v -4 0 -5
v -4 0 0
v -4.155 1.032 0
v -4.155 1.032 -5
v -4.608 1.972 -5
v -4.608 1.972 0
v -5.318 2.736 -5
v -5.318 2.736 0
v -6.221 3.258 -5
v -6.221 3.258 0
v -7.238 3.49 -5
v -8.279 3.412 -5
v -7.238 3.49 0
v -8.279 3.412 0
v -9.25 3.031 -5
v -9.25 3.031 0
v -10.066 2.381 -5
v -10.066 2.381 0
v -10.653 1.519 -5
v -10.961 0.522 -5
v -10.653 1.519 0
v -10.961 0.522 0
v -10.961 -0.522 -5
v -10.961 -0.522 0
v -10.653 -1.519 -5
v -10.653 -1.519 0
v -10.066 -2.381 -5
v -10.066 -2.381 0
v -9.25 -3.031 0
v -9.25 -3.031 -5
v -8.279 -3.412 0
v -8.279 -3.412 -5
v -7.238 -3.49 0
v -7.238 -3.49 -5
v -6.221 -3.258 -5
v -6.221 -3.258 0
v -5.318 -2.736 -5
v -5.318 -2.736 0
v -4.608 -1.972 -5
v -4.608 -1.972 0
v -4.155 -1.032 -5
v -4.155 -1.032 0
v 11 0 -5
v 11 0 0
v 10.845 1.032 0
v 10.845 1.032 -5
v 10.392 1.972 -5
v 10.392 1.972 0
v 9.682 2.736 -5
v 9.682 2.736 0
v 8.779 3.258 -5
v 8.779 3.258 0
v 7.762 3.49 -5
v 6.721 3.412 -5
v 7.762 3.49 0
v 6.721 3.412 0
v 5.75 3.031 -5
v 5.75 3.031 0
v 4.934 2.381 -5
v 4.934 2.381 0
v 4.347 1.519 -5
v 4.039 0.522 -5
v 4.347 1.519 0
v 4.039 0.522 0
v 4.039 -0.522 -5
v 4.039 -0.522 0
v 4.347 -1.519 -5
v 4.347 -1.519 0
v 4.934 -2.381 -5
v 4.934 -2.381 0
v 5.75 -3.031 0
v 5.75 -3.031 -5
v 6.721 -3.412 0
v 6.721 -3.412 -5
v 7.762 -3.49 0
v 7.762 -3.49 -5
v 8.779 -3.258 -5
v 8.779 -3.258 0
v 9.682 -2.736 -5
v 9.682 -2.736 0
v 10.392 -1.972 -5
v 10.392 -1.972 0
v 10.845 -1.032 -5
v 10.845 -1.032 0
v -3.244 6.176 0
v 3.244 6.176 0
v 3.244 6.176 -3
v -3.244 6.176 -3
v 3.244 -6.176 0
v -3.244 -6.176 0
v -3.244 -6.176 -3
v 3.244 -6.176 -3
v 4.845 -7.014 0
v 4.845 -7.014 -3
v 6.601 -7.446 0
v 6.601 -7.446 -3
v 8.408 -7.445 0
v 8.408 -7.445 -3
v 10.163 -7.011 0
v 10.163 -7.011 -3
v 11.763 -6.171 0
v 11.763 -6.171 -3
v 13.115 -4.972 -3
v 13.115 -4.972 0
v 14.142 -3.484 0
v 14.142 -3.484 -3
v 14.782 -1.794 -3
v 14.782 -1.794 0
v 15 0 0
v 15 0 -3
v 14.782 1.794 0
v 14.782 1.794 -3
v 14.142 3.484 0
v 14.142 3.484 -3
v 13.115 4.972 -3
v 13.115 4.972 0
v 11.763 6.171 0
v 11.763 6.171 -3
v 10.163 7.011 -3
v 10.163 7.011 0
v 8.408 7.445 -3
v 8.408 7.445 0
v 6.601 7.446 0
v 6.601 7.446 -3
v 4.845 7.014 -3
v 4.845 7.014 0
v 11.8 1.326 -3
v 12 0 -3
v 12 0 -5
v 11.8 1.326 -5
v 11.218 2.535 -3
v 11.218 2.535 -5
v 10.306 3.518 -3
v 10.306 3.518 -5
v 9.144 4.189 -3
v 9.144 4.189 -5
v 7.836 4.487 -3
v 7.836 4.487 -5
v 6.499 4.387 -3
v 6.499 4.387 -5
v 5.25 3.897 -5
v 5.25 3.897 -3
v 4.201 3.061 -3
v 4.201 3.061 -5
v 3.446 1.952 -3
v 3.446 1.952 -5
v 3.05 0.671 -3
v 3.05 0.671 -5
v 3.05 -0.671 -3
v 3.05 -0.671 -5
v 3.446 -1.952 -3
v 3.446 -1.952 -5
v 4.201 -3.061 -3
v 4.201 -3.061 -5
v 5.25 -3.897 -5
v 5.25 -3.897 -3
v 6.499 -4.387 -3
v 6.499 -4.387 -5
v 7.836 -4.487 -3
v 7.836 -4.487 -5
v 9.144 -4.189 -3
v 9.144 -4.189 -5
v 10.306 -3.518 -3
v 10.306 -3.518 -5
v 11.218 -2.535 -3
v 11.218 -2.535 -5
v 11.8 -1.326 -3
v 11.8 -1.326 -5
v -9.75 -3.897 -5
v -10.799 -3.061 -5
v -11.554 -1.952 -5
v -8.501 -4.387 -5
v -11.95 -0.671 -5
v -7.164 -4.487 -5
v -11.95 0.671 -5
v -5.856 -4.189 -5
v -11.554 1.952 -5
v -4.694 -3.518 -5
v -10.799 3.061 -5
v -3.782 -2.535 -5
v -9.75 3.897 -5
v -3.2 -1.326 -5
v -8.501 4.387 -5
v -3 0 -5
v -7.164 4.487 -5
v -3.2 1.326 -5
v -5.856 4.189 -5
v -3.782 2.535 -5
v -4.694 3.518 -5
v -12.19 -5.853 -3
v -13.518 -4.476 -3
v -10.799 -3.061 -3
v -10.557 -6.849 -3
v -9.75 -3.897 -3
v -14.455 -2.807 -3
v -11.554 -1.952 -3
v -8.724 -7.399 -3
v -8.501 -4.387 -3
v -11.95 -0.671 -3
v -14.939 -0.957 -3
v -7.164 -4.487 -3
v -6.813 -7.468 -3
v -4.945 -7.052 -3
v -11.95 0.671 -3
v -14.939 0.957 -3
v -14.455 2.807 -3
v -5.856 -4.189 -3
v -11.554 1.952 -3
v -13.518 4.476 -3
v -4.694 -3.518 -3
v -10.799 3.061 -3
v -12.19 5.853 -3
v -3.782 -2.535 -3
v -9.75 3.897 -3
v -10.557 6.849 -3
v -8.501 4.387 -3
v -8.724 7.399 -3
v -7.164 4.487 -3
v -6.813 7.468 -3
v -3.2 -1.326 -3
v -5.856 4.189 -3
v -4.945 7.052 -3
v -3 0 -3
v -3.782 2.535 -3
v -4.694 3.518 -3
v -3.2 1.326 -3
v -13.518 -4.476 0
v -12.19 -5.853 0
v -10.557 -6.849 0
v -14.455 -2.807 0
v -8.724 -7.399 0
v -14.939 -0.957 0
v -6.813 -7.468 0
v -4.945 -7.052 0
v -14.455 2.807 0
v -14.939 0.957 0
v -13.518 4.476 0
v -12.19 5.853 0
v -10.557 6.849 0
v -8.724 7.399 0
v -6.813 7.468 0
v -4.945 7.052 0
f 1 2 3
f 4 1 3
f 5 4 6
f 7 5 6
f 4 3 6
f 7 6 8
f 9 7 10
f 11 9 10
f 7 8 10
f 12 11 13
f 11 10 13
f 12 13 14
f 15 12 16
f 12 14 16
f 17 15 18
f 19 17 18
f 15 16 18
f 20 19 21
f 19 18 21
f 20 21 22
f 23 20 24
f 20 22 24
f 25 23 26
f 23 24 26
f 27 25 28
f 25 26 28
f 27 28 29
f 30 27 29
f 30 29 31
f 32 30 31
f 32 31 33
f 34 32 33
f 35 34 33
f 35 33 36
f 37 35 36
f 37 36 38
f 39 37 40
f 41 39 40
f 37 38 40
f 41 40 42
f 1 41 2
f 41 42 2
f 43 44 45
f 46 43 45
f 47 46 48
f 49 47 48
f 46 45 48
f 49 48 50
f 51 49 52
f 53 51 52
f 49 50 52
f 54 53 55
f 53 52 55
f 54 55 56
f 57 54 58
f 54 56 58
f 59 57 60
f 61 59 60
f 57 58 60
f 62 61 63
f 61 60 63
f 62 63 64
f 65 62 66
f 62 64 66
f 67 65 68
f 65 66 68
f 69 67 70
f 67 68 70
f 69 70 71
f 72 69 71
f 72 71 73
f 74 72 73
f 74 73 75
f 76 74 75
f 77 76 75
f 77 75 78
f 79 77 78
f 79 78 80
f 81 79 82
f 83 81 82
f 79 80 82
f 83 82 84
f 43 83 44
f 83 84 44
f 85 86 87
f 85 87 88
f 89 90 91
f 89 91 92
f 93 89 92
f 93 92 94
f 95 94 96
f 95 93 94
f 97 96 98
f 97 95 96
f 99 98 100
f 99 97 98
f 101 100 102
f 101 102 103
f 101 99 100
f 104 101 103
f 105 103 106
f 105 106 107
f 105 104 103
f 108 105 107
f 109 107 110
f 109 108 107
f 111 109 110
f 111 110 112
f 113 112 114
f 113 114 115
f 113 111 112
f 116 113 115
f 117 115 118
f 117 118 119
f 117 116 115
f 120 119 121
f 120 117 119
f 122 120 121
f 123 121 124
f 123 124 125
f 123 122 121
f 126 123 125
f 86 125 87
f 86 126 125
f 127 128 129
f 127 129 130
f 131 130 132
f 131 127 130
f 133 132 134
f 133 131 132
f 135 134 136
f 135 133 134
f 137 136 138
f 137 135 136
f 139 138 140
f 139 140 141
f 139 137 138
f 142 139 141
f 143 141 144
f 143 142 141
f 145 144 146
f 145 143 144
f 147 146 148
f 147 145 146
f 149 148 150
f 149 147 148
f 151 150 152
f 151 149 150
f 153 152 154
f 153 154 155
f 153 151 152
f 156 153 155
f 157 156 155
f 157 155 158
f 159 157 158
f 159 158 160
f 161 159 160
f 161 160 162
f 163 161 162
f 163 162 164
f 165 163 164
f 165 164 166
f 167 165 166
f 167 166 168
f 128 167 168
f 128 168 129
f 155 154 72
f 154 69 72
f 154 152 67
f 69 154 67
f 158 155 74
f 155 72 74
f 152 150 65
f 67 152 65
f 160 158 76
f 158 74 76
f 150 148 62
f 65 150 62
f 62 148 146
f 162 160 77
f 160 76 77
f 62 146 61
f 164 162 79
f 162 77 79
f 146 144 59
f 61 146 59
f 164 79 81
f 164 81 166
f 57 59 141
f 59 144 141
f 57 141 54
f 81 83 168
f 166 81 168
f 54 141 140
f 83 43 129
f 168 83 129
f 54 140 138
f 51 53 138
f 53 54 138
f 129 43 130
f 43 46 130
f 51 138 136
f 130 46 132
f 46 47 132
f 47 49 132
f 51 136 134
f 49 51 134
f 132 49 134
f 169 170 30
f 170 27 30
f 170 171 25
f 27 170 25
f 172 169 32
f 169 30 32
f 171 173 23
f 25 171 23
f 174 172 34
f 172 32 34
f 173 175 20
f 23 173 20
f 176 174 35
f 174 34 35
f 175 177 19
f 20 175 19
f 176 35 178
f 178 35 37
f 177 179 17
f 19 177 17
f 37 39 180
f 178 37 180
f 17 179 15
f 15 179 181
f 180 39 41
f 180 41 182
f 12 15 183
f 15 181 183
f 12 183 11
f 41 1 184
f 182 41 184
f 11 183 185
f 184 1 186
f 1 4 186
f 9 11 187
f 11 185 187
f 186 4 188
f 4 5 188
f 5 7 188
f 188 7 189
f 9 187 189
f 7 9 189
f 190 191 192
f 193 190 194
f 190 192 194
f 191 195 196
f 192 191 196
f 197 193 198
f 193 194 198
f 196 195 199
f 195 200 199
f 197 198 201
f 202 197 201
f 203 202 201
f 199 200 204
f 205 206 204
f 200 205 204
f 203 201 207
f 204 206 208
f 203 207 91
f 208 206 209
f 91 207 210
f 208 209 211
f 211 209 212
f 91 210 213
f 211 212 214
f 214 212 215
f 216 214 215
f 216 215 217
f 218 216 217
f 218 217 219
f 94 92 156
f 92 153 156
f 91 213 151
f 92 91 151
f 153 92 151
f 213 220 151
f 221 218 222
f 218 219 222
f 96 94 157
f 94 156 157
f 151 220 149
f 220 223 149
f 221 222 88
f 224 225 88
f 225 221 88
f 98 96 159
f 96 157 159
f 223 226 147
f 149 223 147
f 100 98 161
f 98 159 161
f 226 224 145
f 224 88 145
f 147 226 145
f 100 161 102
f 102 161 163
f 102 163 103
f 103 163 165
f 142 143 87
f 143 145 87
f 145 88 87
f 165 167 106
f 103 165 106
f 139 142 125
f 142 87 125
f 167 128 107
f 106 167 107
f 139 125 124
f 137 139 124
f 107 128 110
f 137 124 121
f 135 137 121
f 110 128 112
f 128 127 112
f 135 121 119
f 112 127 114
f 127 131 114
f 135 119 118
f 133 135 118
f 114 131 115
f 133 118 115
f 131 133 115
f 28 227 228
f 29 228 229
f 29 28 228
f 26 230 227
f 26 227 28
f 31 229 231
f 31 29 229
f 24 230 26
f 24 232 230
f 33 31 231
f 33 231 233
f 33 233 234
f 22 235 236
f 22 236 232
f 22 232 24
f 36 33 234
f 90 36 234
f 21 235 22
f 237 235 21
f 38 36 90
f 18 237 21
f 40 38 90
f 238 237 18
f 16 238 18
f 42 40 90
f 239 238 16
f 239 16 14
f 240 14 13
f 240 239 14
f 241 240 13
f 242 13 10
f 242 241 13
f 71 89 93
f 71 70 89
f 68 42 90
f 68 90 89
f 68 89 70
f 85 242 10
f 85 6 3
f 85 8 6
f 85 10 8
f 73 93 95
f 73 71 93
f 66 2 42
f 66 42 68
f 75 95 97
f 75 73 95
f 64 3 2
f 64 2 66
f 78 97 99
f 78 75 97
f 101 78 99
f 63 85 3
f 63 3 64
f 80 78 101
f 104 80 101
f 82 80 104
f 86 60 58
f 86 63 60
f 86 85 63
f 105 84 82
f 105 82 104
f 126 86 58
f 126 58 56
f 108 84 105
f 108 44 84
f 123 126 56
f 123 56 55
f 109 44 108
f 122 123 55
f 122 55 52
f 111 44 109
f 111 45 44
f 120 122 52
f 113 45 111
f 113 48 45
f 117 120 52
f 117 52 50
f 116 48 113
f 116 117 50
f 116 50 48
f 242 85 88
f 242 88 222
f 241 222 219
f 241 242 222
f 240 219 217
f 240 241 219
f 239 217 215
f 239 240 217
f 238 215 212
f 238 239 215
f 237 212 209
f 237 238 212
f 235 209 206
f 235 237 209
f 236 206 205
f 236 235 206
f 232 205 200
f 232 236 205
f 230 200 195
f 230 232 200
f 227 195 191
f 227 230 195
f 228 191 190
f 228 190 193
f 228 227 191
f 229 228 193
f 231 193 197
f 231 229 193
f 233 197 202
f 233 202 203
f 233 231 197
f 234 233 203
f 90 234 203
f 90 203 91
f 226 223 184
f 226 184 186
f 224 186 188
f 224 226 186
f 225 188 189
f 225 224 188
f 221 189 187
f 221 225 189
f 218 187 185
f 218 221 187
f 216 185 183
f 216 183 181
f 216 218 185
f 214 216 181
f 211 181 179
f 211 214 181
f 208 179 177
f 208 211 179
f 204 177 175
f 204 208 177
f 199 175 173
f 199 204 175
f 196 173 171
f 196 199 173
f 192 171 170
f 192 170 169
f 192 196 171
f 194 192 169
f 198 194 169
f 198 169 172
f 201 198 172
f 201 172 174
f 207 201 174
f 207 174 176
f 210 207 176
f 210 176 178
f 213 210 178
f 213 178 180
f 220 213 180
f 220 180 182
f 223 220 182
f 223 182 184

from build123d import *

# Parameters (mm, degrees)
F0_R     = 4.5
F1_DEPTH = 3
F0_R_2   = 3.5
F2_DEPTH = 5


with BuildPart() as f1:
    # F0 (on Top) → F1 (new body)
    with BuildSketch(Plane.XY):
        with BuildLine():
            ThreePointArc((0, 0), (-0.860465, 3.488061), (-3.244419, 6.175762))
            ThreePointArc((-3.244419, 6.175762), (-15, 0), (-3.244419, -6.175762))
            ThreePointArc((-3.244419, -6.175762), (-0.860465, -3.488061), (0, 0))
        make_face()
        with Locations((-7.5, 0)):
            Circle(F0_R, mode=Mode.SUBTRACT)
        with BuildLine():
            ThreePointArc((15, 0), (10.988061, 6.639535), (3.244419, 6.175762))
            ThreePointArc((3.244419, 6.175762), (0.860465, 3.488061), (0, 0))
            ThreePointArc((0, 0), (0.860465, -3.488061), (3.244419, -6.175762))
            ThreePointArc((3.244419, -6.175762), (10.988061, -6.639535), (15, 0))
        make_face()
        with Locations((7.5, 0)):
            Circle(F0_R, mode=Mode.SUBTRACT)
        with BuildLine():
            Line((3.244419, 6.175762), (-3.244419, 6.175762))
            ThreePointArc((-3.244419, 6.175762), (-0.860465, 3.488061), (0, 0))
            ThreePointArc((0, 0), (0.860465, 3.488061), (3.244419, 6.175762))
        make_face()
        with BuildLine():
            ThreePointArc((3.244419, -6.175762), (0.860465, -3.488061), (0, 0))
            ThreePointArc((0, 0), (-0.860465, -3.488061), (-3.244419, -6.175762))
            Line((-3.244419, -6.175762), (3.244419, -6.175762))
        make_face()
    extrude(amount=-F1_DEPTH)

    # F0 (on Top) → F2 (join)
    with BuildSketch(Plane.XY):
        with Locations((7.5, 0)):
            Circle(F0_R)
        with Locations((7.5, 0)):
            Circle(F0_R_2, mode=Mode.SUBTRACT)
        with Locations((-7.5, 0)):
            Circle(F0_R)
        with Locations((-7.5, 0)):
            Circle(F0_R_2, mode=Mode.SUBTRACT)
    extrude(amount=-F2_DEPTH)


solid = f1.part
